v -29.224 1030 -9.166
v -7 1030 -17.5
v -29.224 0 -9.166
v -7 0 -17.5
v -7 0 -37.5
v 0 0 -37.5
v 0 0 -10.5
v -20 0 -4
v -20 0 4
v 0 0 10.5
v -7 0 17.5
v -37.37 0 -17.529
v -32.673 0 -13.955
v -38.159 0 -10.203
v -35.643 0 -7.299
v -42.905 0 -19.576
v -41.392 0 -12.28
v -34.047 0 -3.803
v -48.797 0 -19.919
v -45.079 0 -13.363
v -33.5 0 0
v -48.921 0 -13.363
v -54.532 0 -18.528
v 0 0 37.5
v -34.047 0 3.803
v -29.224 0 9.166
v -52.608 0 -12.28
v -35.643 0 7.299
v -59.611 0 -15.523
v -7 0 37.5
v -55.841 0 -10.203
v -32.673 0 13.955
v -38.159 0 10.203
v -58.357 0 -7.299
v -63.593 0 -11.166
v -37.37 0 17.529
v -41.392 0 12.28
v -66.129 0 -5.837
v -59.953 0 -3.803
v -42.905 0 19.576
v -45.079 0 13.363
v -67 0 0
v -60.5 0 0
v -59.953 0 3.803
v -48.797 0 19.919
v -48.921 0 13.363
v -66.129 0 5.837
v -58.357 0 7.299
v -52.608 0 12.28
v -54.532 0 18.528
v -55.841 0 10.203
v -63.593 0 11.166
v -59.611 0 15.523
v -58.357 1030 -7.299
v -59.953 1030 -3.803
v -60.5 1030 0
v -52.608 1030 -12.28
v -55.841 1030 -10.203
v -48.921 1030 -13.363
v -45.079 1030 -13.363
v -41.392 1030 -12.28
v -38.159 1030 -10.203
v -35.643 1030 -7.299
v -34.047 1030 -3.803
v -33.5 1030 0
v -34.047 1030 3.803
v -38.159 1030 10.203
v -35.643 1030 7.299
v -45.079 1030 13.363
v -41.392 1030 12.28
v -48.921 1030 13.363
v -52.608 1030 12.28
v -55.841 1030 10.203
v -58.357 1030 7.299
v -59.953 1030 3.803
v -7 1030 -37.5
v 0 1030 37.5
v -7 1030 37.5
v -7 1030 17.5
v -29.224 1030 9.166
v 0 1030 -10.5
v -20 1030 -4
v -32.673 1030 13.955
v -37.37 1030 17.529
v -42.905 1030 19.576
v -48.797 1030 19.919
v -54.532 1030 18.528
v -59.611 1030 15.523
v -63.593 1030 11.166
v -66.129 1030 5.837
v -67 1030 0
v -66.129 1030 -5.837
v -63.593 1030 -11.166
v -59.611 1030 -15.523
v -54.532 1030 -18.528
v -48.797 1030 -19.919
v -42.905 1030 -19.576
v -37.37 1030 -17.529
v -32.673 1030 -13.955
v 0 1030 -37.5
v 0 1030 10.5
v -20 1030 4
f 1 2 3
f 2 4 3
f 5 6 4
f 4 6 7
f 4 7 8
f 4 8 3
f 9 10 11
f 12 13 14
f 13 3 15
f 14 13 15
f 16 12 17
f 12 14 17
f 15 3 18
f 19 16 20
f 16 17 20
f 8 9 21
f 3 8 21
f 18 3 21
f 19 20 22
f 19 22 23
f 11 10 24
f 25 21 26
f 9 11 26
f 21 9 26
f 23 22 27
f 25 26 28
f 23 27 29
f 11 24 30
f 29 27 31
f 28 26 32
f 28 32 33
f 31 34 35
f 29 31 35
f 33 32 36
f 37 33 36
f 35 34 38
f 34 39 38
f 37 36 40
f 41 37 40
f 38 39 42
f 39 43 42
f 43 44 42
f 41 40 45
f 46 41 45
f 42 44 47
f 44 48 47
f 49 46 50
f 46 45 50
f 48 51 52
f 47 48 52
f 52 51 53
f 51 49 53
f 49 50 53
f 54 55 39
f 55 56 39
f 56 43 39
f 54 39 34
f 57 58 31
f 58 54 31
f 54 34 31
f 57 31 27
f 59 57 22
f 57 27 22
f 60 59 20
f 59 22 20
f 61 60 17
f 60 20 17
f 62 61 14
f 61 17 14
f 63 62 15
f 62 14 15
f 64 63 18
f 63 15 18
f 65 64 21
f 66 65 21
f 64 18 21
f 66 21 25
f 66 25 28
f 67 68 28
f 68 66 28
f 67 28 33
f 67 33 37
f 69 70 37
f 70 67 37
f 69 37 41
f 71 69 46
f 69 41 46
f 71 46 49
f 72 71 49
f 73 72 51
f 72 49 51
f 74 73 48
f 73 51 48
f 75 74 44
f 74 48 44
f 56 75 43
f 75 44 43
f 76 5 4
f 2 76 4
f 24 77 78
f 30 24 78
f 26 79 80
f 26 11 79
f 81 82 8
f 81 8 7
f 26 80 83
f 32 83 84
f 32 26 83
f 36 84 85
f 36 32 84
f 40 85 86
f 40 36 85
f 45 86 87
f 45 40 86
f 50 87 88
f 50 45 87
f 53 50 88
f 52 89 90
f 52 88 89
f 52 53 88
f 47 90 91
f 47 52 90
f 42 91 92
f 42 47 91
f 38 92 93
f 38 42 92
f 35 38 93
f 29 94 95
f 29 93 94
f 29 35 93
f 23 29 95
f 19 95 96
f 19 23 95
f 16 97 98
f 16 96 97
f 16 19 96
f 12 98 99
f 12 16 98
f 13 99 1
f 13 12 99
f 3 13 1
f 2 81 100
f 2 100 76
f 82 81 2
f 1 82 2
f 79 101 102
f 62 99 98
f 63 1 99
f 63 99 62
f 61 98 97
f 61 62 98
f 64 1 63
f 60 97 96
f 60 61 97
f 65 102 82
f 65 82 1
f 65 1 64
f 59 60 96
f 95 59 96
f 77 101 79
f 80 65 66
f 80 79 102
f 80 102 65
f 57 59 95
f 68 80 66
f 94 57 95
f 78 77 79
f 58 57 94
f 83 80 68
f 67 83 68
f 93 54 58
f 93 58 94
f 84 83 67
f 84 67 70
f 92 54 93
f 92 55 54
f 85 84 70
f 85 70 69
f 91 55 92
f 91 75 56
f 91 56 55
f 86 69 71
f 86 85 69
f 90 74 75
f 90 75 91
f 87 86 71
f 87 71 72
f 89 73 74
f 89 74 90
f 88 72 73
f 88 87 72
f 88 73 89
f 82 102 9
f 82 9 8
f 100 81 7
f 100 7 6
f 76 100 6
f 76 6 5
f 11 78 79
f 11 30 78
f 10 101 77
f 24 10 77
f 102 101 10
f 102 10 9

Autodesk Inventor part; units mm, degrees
ref_plane "YZ Plane" through (0, 0, 0) normal (1, 0, 0) x (0, 1, 0)
ref_plane "XZ Plane" through (0, 0, 0) normal (0, 1, 0) x (-1, 0, 0)
ref_plane "XY Plane" through (0, 0, 0) normal (0, 0, 1) x (1, 0, 0)
sketch "Sketch1" plane through (0, 0, 0) normal (0, 1, 0) x (-1, 0, 0)
  line L0 (0, 0) -> (0, -37.5)
  line L1 (0, 0) -> (0, 37.5)
  line L2 (0, 37.5) -> (7, 37.5)
  line L3 (7, 37.5) -> (7, 17.5)
  line L4 (0, -37.5) -> (7, -37.5)
  line L5 (7, -37.5) -> (7, -17.5)
  line L6 (7, 0) -> (27, 0) construction
  line L7 (27, -10) -> (7, -17.5)
  line L8 (7, 17.5) -> (27, 10)
  line L9 (27, 0) -> (47, 0)
  circle A0 centre (47, 0) radius 20
  circle A1 centre (47, 0) radius 13.5
  line L10 (27, 10) -> (29.224, 9.166)
  line L11 (27, -10) -> (29.224, -9.166)
  line L12 (0, 17.5) -> (0, 10.5)
  line L13 (20, 0) -> (20, 4)
  line L14 (0, 10.5) -> (20, 4)
  line L15 (0, -17.5) -> (0, -10.5)
  line L16 (20, 0) -> (20, -4)
  line L17 (20, -4) -> (0, -10.5)
  dimension "d0" = 37.5
  dimension "d1" = 37.5
  dimension "d2" = 7
  dimension "d3" = 20
  dimension "d4" = 20
  dimension "d11" = 27
  dimension "d12" = 7
  dimension "d14" = 4
  dimension "d16" = 7
  dimension "d18" = 4
extrude "Extrusion1" add sketch "Sketch1" along normal blind 1030 contours L17 L16 L13 L14 L1 L2 L3 L8 L10 A0 L11 L7 L5 L4 L0 | A0
sketch "Sketch2" plane through (0, 1030, 0) normal (0, 1, 0) x (1, 0, 0)
  point P0 (0, 0)
properties part number "linear_drive_new"
